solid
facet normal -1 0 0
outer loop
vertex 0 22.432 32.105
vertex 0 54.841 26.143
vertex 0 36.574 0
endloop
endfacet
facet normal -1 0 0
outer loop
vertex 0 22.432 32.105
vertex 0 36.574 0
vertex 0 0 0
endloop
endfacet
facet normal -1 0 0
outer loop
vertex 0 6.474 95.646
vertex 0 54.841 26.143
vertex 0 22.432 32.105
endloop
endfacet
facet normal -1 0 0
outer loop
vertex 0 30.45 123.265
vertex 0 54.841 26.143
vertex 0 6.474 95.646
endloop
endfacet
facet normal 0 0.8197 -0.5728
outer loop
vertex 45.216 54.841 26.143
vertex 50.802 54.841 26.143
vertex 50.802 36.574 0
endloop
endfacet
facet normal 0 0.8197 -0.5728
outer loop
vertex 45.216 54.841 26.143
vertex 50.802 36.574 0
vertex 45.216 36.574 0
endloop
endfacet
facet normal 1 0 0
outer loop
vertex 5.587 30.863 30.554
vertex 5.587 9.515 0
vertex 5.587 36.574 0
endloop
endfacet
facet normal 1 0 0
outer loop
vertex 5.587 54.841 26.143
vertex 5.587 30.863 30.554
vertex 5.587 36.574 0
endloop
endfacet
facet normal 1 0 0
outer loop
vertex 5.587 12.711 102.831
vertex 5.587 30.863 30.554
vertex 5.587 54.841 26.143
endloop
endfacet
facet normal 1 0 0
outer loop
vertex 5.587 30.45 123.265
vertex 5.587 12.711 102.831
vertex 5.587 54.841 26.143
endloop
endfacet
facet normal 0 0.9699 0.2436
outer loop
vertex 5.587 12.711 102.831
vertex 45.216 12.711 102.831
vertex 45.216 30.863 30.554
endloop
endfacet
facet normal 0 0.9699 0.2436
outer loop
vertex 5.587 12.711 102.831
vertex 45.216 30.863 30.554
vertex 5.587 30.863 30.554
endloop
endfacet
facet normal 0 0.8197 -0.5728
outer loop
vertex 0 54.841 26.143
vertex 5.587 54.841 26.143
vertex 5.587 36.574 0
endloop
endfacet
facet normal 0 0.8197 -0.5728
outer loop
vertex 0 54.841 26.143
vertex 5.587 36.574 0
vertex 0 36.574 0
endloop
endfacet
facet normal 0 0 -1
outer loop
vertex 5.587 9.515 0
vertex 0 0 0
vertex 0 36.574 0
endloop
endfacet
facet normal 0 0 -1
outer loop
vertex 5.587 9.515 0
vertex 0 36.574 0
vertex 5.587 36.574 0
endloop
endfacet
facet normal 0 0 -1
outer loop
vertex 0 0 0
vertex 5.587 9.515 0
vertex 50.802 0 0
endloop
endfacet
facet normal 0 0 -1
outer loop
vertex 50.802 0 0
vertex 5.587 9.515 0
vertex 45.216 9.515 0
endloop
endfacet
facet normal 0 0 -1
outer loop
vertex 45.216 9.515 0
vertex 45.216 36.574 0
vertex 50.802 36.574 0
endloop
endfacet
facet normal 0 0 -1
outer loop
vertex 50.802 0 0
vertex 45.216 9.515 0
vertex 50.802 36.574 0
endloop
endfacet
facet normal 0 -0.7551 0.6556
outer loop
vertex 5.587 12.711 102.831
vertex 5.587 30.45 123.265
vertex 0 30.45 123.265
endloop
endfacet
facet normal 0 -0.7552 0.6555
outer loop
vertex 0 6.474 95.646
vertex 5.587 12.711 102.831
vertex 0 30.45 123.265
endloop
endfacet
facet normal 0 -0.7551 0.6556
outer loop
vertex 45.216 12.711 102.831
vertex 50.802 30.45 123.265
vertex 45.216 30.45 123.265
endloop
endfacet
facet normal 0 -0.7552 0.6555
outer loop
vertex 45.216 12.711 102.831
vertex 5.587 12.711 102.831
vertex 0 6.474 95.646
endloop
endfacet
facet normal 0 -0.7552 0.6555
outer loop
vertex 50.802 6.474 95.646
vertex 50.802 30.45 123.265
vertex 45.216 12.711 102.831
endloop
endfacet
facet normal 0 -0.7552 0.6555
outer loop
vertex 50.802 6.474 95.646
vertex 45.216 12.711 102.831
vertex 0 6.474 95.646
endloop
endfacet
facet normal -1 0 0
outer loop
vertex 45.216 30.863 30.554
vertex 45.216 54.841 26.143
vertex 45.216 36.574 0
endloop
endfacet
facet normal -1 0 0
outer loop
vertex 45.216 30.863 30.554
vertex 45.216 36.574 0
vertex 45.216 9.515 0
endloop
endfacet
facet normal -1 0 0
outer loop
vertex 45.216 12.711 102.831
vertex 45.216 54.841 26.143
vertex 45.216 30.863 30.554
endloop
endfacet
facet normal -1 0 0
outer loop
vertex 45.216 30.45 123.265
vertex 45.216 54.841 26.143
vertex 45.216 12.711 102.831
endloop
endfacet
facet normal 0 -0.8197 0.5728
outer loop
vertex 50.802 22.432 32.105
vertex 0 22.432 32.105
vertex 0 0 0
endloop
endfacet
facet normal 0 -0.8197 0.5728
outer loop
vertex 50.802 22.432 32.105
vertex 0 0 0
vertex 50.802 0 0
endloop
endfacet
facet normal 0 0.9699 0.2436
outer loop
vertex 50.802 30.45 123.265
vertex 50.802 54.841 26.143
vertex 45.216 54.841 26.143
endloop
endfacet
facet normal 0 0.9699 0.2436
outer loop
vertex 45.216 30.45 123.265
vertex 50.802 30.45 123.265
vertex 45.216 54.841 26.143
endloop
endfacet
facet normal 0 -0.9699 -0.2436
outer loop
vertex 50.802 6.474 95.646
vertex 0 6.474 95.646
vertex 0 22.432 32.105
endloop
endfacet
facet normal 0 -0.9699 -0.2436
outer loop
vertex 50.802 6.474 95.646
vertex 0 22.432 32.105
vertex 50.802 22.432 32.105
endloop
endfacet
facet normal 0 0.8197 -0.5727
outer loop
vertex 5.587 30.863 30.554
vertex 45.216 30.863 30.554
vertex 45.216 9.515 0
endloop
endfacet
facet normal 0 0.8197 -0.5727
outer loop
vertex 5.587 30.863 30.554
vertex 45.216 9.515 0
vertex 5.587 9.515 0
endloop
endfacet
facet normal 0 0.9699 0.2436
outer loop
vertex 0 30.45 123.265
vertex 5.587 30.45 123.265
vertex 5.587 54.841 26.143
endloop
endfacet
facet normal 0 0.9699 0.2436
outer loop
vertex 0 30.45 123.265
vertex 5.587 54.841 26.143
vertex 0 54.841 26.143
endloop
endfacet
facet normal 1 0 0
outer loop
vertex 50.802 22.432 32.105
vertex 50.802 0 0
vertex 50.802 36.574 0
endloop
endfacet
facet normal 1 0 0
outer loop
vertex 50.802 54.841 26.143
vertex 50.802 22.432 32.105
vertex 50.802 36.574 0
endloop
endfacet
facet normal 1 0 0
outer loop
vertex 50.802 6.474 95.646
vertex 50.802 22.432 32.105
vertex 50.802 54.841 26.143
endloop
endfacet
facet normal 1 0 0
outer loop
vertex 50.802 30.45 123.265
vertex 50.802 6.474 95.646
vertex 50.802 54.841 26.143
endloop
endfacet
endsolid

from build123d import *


with BuildPart() as part:
    # Sweep1: sweep along a path in Sketch2
    with BuildLine(Plane(origin=(0, 0, 0), x_dir=(0, 0, -1), z_dir=(1, 0, 0))) as sweep1_path:
        Line((0, 0), (-32.104520915, 22.431507437))
        Line((-32.104520915, 22.431507437), (-95.645680379, 6.47418981))
    # Sketch1 → Sweep1 (sweep)
    with BuildSketch(Plane.XY):
        Polygon((0, 0), (0, 36.574241376), (5.586518969, 36.574241376), (5.586518969, 9.514540119), (45.215887907, 9.514540119), (45.215887907, 36.574241376), (50.802406876, 36.574241376), (50.802406876, 0), align=None)
    sweep(path=sweep1_path.line, transition=Transition.RIGHT)


solid = part.part
